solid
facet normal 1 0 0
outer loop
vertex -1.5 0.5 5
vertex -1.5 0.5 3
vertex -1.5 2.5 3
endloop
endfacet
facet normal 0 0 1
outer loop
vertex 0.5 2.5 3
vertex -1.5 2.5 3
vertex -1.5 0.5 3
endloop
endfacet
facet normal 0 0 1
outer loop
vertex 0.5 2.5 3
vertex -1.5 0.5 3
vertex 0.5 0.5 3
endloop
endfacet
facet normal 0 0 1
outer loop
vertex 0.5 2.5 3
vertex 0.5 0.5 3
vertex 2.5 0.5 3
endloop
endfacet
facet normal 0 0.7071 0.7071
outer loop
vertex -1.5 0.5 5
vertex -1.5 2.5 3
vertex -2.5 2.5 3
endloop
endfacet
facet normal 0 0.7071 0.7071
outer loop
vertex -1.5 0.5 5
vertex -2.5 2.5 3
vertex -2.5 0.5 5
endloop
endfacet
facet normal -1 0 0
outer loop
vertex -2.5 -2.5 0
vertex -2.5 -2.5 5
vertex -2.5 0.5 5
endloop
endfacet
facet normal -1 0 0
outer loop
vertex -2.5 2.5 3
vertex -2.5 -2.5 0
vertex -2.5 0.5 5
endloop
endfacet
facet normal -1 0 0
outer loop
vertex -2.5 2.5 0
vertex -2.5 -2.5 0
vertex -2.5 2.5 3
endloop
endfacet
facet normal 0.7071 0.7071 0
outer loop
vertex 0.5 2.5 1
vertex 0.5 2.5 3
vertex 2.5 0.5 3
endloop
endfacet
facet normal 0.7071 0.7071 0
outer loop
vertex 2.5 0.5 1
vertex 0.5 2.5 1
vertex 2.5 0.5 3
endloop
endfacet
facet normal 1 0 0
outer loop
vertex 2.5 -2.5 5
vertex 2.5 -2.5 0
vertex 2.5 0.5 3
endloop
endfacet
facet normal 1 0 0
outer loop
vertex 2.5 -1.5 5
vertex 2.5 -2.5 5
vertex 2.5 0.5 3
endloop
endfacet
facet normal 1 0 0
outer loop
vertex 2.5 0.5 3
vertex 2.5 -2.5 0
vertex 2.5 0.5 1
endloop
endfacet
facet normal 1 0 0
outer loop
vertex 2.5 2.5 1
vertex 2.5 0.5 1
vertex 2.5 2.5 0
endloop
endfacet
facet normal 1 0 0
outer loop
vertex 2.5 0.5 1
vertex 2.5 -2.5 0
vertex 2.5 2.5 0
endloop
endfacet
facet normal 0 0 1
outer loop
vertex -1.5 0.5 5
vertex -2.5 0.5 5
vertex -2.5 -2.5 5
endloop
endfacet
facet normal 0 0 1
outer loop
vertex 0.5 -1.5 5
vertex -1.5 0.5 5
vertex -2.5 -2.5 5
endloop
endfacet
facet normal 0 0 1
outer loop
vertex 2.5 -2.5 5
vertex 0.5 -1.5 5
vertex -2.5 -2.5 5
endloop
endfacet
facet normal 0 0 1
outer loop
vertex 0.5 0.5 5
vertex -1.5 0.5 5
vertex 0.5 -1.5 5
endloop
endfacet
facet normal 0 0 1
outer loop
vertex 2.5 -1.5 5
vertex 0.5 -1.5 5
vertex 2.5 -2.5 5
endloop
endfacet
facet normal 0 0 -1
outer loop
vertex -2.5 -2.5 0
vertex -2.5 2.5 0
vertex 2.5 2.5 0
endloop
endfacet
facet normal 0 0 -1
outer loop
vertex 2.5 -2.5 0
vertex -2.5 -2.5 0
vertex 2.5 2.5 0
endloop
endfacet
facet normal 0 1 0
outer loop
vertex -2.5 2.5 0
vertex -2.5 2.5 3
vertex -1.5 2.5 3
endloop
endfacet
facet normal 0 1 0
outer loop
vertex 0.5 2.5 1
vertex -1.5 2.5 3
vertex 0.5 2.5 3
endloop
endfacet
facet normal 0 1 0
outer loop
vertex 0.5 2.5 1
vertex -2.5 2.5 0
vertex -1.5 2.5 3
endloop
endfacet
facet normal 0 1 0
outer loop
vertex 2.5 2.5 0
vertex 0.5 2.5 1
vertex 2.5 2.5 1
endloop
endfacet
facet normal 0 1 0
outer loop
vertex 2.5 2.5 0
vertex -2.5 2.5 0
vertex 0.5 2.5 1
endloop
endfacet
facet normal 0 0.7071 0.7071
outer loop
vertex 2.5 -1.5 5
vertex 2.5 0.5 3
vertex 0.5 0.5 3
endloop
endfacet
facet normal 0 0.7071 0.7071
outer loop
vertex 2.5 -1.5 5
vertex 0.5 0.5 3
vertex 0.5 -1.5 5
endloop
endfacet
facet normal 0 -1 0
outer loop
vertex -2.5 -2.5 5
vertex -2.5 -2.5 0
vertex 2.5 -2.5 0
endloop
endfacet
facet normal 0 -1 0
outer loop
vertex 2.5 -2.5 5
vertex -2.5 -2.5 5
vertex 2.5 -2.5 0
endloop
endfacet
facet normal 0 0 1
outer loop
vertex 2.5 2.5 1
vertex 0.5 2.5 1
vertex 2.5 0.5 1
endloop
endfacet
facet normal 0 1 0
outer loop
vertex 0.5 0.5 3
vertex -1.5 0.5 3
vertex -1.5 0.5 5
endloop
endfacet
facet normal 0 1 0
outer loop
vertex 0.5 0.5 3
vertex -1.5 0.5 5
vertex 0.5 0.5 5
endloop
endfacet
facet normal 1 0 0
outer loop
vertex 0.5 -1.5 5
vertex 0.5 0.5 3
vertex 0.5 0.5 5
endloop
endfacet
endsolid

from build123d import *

# Parameters (mm, degrees)
SKETCH1_W           = 5
SKETCH1_H           = 5
BOSS_EXTRUDE1_DEPTH = 5
CUT_EXTRUDE1_DEPTH  = 4
SKETCH3_W           = 4
SKETCH3_H           = 2
CUT_EXTRUDE3_DEPTH  = 2
CUT_EXTRUDE4_DEPTH  = 2
CUT_EXTRUDE5_DEPTH  = 2
CUT_EXTRUDE6_DEPTH  = 2


with BuildPart() as part:
    # Sketch1 → Boss-Extrude1 (new body)
    with BuildSketch(Plane.XY):
        Rectangle(SKETCH1_W, SKETCH1_H)
    extrude(amount=BOSS_EXTRUDE1_DEPTH)

    # Sketch2 → Cut-Extrude1 (cut)
    with BuildSketch(Plane(origin=(2.5, 0, 0), x_dir=(0, 0, -1), z_dir=(1, 0, 0))):
        Polygon((-3, 2.5), (-5, 0.5), (-5, 2.5), align=None)
    extrude(amount=-CUT_EXTRUDE1_DEPTH, mode=Mode.SUBTRACT)

    # Sketch3 → Cut-Extrude3 (cut)
    with BuildSketch(Plane(origin=(0, 2.5, 0), x_dir=(1, 0, 0), z_dir=(0, 1, 0))):
        with Locations((0.5, -4)):
            Rectangle(SKETCH3_W, SKETCH3_H)
    extrude(amount=-CUT_EXTRUDE3_DEPTH, mode=Mode.SUBTRACT)

    # Sketch4 → Cut-Extrude4 (cut)
    with BuildSketch(Plane(origin=(2.5, 0, 0), x_dir=(0, 0, -1), z_dir=(1, 0, 0))):
        Polygon((-3, 0.5), (-5, -1.5), (-5, 0.5), align=None)
    extrude(amount=-CUT_EXTRUDE4_DEPTH, mode=Mode.SUBTRACT)

    # Sketch5 → Cut-Extrude5 (cut)
    with BuildSketch(Plane.XY.offset(3)):
        Polygon((0.5, 2.5), (2.5, 0.5), (2.5, 2.5), align=None)
    extrude(amount=-CUT_EXTRUDE5_DEPTH, mode=Mode.SUBTRACT)

    # Sketch6 → Cut-Extrude6 (cut, through all)
    with BuildSketch(Plane(origin=(-1.5, 0, 0), x_dir=(0, 0, -1), z_dir=(1, 0, 0))):
        Polygon((-3, 2.5), (-5, 0.5), (-5, 2.5), align=None)
    extrude(amount=-CUT_EXTRUDE6_DEPTH, mode=Mode.SUBTRACT)


solid = part.part
